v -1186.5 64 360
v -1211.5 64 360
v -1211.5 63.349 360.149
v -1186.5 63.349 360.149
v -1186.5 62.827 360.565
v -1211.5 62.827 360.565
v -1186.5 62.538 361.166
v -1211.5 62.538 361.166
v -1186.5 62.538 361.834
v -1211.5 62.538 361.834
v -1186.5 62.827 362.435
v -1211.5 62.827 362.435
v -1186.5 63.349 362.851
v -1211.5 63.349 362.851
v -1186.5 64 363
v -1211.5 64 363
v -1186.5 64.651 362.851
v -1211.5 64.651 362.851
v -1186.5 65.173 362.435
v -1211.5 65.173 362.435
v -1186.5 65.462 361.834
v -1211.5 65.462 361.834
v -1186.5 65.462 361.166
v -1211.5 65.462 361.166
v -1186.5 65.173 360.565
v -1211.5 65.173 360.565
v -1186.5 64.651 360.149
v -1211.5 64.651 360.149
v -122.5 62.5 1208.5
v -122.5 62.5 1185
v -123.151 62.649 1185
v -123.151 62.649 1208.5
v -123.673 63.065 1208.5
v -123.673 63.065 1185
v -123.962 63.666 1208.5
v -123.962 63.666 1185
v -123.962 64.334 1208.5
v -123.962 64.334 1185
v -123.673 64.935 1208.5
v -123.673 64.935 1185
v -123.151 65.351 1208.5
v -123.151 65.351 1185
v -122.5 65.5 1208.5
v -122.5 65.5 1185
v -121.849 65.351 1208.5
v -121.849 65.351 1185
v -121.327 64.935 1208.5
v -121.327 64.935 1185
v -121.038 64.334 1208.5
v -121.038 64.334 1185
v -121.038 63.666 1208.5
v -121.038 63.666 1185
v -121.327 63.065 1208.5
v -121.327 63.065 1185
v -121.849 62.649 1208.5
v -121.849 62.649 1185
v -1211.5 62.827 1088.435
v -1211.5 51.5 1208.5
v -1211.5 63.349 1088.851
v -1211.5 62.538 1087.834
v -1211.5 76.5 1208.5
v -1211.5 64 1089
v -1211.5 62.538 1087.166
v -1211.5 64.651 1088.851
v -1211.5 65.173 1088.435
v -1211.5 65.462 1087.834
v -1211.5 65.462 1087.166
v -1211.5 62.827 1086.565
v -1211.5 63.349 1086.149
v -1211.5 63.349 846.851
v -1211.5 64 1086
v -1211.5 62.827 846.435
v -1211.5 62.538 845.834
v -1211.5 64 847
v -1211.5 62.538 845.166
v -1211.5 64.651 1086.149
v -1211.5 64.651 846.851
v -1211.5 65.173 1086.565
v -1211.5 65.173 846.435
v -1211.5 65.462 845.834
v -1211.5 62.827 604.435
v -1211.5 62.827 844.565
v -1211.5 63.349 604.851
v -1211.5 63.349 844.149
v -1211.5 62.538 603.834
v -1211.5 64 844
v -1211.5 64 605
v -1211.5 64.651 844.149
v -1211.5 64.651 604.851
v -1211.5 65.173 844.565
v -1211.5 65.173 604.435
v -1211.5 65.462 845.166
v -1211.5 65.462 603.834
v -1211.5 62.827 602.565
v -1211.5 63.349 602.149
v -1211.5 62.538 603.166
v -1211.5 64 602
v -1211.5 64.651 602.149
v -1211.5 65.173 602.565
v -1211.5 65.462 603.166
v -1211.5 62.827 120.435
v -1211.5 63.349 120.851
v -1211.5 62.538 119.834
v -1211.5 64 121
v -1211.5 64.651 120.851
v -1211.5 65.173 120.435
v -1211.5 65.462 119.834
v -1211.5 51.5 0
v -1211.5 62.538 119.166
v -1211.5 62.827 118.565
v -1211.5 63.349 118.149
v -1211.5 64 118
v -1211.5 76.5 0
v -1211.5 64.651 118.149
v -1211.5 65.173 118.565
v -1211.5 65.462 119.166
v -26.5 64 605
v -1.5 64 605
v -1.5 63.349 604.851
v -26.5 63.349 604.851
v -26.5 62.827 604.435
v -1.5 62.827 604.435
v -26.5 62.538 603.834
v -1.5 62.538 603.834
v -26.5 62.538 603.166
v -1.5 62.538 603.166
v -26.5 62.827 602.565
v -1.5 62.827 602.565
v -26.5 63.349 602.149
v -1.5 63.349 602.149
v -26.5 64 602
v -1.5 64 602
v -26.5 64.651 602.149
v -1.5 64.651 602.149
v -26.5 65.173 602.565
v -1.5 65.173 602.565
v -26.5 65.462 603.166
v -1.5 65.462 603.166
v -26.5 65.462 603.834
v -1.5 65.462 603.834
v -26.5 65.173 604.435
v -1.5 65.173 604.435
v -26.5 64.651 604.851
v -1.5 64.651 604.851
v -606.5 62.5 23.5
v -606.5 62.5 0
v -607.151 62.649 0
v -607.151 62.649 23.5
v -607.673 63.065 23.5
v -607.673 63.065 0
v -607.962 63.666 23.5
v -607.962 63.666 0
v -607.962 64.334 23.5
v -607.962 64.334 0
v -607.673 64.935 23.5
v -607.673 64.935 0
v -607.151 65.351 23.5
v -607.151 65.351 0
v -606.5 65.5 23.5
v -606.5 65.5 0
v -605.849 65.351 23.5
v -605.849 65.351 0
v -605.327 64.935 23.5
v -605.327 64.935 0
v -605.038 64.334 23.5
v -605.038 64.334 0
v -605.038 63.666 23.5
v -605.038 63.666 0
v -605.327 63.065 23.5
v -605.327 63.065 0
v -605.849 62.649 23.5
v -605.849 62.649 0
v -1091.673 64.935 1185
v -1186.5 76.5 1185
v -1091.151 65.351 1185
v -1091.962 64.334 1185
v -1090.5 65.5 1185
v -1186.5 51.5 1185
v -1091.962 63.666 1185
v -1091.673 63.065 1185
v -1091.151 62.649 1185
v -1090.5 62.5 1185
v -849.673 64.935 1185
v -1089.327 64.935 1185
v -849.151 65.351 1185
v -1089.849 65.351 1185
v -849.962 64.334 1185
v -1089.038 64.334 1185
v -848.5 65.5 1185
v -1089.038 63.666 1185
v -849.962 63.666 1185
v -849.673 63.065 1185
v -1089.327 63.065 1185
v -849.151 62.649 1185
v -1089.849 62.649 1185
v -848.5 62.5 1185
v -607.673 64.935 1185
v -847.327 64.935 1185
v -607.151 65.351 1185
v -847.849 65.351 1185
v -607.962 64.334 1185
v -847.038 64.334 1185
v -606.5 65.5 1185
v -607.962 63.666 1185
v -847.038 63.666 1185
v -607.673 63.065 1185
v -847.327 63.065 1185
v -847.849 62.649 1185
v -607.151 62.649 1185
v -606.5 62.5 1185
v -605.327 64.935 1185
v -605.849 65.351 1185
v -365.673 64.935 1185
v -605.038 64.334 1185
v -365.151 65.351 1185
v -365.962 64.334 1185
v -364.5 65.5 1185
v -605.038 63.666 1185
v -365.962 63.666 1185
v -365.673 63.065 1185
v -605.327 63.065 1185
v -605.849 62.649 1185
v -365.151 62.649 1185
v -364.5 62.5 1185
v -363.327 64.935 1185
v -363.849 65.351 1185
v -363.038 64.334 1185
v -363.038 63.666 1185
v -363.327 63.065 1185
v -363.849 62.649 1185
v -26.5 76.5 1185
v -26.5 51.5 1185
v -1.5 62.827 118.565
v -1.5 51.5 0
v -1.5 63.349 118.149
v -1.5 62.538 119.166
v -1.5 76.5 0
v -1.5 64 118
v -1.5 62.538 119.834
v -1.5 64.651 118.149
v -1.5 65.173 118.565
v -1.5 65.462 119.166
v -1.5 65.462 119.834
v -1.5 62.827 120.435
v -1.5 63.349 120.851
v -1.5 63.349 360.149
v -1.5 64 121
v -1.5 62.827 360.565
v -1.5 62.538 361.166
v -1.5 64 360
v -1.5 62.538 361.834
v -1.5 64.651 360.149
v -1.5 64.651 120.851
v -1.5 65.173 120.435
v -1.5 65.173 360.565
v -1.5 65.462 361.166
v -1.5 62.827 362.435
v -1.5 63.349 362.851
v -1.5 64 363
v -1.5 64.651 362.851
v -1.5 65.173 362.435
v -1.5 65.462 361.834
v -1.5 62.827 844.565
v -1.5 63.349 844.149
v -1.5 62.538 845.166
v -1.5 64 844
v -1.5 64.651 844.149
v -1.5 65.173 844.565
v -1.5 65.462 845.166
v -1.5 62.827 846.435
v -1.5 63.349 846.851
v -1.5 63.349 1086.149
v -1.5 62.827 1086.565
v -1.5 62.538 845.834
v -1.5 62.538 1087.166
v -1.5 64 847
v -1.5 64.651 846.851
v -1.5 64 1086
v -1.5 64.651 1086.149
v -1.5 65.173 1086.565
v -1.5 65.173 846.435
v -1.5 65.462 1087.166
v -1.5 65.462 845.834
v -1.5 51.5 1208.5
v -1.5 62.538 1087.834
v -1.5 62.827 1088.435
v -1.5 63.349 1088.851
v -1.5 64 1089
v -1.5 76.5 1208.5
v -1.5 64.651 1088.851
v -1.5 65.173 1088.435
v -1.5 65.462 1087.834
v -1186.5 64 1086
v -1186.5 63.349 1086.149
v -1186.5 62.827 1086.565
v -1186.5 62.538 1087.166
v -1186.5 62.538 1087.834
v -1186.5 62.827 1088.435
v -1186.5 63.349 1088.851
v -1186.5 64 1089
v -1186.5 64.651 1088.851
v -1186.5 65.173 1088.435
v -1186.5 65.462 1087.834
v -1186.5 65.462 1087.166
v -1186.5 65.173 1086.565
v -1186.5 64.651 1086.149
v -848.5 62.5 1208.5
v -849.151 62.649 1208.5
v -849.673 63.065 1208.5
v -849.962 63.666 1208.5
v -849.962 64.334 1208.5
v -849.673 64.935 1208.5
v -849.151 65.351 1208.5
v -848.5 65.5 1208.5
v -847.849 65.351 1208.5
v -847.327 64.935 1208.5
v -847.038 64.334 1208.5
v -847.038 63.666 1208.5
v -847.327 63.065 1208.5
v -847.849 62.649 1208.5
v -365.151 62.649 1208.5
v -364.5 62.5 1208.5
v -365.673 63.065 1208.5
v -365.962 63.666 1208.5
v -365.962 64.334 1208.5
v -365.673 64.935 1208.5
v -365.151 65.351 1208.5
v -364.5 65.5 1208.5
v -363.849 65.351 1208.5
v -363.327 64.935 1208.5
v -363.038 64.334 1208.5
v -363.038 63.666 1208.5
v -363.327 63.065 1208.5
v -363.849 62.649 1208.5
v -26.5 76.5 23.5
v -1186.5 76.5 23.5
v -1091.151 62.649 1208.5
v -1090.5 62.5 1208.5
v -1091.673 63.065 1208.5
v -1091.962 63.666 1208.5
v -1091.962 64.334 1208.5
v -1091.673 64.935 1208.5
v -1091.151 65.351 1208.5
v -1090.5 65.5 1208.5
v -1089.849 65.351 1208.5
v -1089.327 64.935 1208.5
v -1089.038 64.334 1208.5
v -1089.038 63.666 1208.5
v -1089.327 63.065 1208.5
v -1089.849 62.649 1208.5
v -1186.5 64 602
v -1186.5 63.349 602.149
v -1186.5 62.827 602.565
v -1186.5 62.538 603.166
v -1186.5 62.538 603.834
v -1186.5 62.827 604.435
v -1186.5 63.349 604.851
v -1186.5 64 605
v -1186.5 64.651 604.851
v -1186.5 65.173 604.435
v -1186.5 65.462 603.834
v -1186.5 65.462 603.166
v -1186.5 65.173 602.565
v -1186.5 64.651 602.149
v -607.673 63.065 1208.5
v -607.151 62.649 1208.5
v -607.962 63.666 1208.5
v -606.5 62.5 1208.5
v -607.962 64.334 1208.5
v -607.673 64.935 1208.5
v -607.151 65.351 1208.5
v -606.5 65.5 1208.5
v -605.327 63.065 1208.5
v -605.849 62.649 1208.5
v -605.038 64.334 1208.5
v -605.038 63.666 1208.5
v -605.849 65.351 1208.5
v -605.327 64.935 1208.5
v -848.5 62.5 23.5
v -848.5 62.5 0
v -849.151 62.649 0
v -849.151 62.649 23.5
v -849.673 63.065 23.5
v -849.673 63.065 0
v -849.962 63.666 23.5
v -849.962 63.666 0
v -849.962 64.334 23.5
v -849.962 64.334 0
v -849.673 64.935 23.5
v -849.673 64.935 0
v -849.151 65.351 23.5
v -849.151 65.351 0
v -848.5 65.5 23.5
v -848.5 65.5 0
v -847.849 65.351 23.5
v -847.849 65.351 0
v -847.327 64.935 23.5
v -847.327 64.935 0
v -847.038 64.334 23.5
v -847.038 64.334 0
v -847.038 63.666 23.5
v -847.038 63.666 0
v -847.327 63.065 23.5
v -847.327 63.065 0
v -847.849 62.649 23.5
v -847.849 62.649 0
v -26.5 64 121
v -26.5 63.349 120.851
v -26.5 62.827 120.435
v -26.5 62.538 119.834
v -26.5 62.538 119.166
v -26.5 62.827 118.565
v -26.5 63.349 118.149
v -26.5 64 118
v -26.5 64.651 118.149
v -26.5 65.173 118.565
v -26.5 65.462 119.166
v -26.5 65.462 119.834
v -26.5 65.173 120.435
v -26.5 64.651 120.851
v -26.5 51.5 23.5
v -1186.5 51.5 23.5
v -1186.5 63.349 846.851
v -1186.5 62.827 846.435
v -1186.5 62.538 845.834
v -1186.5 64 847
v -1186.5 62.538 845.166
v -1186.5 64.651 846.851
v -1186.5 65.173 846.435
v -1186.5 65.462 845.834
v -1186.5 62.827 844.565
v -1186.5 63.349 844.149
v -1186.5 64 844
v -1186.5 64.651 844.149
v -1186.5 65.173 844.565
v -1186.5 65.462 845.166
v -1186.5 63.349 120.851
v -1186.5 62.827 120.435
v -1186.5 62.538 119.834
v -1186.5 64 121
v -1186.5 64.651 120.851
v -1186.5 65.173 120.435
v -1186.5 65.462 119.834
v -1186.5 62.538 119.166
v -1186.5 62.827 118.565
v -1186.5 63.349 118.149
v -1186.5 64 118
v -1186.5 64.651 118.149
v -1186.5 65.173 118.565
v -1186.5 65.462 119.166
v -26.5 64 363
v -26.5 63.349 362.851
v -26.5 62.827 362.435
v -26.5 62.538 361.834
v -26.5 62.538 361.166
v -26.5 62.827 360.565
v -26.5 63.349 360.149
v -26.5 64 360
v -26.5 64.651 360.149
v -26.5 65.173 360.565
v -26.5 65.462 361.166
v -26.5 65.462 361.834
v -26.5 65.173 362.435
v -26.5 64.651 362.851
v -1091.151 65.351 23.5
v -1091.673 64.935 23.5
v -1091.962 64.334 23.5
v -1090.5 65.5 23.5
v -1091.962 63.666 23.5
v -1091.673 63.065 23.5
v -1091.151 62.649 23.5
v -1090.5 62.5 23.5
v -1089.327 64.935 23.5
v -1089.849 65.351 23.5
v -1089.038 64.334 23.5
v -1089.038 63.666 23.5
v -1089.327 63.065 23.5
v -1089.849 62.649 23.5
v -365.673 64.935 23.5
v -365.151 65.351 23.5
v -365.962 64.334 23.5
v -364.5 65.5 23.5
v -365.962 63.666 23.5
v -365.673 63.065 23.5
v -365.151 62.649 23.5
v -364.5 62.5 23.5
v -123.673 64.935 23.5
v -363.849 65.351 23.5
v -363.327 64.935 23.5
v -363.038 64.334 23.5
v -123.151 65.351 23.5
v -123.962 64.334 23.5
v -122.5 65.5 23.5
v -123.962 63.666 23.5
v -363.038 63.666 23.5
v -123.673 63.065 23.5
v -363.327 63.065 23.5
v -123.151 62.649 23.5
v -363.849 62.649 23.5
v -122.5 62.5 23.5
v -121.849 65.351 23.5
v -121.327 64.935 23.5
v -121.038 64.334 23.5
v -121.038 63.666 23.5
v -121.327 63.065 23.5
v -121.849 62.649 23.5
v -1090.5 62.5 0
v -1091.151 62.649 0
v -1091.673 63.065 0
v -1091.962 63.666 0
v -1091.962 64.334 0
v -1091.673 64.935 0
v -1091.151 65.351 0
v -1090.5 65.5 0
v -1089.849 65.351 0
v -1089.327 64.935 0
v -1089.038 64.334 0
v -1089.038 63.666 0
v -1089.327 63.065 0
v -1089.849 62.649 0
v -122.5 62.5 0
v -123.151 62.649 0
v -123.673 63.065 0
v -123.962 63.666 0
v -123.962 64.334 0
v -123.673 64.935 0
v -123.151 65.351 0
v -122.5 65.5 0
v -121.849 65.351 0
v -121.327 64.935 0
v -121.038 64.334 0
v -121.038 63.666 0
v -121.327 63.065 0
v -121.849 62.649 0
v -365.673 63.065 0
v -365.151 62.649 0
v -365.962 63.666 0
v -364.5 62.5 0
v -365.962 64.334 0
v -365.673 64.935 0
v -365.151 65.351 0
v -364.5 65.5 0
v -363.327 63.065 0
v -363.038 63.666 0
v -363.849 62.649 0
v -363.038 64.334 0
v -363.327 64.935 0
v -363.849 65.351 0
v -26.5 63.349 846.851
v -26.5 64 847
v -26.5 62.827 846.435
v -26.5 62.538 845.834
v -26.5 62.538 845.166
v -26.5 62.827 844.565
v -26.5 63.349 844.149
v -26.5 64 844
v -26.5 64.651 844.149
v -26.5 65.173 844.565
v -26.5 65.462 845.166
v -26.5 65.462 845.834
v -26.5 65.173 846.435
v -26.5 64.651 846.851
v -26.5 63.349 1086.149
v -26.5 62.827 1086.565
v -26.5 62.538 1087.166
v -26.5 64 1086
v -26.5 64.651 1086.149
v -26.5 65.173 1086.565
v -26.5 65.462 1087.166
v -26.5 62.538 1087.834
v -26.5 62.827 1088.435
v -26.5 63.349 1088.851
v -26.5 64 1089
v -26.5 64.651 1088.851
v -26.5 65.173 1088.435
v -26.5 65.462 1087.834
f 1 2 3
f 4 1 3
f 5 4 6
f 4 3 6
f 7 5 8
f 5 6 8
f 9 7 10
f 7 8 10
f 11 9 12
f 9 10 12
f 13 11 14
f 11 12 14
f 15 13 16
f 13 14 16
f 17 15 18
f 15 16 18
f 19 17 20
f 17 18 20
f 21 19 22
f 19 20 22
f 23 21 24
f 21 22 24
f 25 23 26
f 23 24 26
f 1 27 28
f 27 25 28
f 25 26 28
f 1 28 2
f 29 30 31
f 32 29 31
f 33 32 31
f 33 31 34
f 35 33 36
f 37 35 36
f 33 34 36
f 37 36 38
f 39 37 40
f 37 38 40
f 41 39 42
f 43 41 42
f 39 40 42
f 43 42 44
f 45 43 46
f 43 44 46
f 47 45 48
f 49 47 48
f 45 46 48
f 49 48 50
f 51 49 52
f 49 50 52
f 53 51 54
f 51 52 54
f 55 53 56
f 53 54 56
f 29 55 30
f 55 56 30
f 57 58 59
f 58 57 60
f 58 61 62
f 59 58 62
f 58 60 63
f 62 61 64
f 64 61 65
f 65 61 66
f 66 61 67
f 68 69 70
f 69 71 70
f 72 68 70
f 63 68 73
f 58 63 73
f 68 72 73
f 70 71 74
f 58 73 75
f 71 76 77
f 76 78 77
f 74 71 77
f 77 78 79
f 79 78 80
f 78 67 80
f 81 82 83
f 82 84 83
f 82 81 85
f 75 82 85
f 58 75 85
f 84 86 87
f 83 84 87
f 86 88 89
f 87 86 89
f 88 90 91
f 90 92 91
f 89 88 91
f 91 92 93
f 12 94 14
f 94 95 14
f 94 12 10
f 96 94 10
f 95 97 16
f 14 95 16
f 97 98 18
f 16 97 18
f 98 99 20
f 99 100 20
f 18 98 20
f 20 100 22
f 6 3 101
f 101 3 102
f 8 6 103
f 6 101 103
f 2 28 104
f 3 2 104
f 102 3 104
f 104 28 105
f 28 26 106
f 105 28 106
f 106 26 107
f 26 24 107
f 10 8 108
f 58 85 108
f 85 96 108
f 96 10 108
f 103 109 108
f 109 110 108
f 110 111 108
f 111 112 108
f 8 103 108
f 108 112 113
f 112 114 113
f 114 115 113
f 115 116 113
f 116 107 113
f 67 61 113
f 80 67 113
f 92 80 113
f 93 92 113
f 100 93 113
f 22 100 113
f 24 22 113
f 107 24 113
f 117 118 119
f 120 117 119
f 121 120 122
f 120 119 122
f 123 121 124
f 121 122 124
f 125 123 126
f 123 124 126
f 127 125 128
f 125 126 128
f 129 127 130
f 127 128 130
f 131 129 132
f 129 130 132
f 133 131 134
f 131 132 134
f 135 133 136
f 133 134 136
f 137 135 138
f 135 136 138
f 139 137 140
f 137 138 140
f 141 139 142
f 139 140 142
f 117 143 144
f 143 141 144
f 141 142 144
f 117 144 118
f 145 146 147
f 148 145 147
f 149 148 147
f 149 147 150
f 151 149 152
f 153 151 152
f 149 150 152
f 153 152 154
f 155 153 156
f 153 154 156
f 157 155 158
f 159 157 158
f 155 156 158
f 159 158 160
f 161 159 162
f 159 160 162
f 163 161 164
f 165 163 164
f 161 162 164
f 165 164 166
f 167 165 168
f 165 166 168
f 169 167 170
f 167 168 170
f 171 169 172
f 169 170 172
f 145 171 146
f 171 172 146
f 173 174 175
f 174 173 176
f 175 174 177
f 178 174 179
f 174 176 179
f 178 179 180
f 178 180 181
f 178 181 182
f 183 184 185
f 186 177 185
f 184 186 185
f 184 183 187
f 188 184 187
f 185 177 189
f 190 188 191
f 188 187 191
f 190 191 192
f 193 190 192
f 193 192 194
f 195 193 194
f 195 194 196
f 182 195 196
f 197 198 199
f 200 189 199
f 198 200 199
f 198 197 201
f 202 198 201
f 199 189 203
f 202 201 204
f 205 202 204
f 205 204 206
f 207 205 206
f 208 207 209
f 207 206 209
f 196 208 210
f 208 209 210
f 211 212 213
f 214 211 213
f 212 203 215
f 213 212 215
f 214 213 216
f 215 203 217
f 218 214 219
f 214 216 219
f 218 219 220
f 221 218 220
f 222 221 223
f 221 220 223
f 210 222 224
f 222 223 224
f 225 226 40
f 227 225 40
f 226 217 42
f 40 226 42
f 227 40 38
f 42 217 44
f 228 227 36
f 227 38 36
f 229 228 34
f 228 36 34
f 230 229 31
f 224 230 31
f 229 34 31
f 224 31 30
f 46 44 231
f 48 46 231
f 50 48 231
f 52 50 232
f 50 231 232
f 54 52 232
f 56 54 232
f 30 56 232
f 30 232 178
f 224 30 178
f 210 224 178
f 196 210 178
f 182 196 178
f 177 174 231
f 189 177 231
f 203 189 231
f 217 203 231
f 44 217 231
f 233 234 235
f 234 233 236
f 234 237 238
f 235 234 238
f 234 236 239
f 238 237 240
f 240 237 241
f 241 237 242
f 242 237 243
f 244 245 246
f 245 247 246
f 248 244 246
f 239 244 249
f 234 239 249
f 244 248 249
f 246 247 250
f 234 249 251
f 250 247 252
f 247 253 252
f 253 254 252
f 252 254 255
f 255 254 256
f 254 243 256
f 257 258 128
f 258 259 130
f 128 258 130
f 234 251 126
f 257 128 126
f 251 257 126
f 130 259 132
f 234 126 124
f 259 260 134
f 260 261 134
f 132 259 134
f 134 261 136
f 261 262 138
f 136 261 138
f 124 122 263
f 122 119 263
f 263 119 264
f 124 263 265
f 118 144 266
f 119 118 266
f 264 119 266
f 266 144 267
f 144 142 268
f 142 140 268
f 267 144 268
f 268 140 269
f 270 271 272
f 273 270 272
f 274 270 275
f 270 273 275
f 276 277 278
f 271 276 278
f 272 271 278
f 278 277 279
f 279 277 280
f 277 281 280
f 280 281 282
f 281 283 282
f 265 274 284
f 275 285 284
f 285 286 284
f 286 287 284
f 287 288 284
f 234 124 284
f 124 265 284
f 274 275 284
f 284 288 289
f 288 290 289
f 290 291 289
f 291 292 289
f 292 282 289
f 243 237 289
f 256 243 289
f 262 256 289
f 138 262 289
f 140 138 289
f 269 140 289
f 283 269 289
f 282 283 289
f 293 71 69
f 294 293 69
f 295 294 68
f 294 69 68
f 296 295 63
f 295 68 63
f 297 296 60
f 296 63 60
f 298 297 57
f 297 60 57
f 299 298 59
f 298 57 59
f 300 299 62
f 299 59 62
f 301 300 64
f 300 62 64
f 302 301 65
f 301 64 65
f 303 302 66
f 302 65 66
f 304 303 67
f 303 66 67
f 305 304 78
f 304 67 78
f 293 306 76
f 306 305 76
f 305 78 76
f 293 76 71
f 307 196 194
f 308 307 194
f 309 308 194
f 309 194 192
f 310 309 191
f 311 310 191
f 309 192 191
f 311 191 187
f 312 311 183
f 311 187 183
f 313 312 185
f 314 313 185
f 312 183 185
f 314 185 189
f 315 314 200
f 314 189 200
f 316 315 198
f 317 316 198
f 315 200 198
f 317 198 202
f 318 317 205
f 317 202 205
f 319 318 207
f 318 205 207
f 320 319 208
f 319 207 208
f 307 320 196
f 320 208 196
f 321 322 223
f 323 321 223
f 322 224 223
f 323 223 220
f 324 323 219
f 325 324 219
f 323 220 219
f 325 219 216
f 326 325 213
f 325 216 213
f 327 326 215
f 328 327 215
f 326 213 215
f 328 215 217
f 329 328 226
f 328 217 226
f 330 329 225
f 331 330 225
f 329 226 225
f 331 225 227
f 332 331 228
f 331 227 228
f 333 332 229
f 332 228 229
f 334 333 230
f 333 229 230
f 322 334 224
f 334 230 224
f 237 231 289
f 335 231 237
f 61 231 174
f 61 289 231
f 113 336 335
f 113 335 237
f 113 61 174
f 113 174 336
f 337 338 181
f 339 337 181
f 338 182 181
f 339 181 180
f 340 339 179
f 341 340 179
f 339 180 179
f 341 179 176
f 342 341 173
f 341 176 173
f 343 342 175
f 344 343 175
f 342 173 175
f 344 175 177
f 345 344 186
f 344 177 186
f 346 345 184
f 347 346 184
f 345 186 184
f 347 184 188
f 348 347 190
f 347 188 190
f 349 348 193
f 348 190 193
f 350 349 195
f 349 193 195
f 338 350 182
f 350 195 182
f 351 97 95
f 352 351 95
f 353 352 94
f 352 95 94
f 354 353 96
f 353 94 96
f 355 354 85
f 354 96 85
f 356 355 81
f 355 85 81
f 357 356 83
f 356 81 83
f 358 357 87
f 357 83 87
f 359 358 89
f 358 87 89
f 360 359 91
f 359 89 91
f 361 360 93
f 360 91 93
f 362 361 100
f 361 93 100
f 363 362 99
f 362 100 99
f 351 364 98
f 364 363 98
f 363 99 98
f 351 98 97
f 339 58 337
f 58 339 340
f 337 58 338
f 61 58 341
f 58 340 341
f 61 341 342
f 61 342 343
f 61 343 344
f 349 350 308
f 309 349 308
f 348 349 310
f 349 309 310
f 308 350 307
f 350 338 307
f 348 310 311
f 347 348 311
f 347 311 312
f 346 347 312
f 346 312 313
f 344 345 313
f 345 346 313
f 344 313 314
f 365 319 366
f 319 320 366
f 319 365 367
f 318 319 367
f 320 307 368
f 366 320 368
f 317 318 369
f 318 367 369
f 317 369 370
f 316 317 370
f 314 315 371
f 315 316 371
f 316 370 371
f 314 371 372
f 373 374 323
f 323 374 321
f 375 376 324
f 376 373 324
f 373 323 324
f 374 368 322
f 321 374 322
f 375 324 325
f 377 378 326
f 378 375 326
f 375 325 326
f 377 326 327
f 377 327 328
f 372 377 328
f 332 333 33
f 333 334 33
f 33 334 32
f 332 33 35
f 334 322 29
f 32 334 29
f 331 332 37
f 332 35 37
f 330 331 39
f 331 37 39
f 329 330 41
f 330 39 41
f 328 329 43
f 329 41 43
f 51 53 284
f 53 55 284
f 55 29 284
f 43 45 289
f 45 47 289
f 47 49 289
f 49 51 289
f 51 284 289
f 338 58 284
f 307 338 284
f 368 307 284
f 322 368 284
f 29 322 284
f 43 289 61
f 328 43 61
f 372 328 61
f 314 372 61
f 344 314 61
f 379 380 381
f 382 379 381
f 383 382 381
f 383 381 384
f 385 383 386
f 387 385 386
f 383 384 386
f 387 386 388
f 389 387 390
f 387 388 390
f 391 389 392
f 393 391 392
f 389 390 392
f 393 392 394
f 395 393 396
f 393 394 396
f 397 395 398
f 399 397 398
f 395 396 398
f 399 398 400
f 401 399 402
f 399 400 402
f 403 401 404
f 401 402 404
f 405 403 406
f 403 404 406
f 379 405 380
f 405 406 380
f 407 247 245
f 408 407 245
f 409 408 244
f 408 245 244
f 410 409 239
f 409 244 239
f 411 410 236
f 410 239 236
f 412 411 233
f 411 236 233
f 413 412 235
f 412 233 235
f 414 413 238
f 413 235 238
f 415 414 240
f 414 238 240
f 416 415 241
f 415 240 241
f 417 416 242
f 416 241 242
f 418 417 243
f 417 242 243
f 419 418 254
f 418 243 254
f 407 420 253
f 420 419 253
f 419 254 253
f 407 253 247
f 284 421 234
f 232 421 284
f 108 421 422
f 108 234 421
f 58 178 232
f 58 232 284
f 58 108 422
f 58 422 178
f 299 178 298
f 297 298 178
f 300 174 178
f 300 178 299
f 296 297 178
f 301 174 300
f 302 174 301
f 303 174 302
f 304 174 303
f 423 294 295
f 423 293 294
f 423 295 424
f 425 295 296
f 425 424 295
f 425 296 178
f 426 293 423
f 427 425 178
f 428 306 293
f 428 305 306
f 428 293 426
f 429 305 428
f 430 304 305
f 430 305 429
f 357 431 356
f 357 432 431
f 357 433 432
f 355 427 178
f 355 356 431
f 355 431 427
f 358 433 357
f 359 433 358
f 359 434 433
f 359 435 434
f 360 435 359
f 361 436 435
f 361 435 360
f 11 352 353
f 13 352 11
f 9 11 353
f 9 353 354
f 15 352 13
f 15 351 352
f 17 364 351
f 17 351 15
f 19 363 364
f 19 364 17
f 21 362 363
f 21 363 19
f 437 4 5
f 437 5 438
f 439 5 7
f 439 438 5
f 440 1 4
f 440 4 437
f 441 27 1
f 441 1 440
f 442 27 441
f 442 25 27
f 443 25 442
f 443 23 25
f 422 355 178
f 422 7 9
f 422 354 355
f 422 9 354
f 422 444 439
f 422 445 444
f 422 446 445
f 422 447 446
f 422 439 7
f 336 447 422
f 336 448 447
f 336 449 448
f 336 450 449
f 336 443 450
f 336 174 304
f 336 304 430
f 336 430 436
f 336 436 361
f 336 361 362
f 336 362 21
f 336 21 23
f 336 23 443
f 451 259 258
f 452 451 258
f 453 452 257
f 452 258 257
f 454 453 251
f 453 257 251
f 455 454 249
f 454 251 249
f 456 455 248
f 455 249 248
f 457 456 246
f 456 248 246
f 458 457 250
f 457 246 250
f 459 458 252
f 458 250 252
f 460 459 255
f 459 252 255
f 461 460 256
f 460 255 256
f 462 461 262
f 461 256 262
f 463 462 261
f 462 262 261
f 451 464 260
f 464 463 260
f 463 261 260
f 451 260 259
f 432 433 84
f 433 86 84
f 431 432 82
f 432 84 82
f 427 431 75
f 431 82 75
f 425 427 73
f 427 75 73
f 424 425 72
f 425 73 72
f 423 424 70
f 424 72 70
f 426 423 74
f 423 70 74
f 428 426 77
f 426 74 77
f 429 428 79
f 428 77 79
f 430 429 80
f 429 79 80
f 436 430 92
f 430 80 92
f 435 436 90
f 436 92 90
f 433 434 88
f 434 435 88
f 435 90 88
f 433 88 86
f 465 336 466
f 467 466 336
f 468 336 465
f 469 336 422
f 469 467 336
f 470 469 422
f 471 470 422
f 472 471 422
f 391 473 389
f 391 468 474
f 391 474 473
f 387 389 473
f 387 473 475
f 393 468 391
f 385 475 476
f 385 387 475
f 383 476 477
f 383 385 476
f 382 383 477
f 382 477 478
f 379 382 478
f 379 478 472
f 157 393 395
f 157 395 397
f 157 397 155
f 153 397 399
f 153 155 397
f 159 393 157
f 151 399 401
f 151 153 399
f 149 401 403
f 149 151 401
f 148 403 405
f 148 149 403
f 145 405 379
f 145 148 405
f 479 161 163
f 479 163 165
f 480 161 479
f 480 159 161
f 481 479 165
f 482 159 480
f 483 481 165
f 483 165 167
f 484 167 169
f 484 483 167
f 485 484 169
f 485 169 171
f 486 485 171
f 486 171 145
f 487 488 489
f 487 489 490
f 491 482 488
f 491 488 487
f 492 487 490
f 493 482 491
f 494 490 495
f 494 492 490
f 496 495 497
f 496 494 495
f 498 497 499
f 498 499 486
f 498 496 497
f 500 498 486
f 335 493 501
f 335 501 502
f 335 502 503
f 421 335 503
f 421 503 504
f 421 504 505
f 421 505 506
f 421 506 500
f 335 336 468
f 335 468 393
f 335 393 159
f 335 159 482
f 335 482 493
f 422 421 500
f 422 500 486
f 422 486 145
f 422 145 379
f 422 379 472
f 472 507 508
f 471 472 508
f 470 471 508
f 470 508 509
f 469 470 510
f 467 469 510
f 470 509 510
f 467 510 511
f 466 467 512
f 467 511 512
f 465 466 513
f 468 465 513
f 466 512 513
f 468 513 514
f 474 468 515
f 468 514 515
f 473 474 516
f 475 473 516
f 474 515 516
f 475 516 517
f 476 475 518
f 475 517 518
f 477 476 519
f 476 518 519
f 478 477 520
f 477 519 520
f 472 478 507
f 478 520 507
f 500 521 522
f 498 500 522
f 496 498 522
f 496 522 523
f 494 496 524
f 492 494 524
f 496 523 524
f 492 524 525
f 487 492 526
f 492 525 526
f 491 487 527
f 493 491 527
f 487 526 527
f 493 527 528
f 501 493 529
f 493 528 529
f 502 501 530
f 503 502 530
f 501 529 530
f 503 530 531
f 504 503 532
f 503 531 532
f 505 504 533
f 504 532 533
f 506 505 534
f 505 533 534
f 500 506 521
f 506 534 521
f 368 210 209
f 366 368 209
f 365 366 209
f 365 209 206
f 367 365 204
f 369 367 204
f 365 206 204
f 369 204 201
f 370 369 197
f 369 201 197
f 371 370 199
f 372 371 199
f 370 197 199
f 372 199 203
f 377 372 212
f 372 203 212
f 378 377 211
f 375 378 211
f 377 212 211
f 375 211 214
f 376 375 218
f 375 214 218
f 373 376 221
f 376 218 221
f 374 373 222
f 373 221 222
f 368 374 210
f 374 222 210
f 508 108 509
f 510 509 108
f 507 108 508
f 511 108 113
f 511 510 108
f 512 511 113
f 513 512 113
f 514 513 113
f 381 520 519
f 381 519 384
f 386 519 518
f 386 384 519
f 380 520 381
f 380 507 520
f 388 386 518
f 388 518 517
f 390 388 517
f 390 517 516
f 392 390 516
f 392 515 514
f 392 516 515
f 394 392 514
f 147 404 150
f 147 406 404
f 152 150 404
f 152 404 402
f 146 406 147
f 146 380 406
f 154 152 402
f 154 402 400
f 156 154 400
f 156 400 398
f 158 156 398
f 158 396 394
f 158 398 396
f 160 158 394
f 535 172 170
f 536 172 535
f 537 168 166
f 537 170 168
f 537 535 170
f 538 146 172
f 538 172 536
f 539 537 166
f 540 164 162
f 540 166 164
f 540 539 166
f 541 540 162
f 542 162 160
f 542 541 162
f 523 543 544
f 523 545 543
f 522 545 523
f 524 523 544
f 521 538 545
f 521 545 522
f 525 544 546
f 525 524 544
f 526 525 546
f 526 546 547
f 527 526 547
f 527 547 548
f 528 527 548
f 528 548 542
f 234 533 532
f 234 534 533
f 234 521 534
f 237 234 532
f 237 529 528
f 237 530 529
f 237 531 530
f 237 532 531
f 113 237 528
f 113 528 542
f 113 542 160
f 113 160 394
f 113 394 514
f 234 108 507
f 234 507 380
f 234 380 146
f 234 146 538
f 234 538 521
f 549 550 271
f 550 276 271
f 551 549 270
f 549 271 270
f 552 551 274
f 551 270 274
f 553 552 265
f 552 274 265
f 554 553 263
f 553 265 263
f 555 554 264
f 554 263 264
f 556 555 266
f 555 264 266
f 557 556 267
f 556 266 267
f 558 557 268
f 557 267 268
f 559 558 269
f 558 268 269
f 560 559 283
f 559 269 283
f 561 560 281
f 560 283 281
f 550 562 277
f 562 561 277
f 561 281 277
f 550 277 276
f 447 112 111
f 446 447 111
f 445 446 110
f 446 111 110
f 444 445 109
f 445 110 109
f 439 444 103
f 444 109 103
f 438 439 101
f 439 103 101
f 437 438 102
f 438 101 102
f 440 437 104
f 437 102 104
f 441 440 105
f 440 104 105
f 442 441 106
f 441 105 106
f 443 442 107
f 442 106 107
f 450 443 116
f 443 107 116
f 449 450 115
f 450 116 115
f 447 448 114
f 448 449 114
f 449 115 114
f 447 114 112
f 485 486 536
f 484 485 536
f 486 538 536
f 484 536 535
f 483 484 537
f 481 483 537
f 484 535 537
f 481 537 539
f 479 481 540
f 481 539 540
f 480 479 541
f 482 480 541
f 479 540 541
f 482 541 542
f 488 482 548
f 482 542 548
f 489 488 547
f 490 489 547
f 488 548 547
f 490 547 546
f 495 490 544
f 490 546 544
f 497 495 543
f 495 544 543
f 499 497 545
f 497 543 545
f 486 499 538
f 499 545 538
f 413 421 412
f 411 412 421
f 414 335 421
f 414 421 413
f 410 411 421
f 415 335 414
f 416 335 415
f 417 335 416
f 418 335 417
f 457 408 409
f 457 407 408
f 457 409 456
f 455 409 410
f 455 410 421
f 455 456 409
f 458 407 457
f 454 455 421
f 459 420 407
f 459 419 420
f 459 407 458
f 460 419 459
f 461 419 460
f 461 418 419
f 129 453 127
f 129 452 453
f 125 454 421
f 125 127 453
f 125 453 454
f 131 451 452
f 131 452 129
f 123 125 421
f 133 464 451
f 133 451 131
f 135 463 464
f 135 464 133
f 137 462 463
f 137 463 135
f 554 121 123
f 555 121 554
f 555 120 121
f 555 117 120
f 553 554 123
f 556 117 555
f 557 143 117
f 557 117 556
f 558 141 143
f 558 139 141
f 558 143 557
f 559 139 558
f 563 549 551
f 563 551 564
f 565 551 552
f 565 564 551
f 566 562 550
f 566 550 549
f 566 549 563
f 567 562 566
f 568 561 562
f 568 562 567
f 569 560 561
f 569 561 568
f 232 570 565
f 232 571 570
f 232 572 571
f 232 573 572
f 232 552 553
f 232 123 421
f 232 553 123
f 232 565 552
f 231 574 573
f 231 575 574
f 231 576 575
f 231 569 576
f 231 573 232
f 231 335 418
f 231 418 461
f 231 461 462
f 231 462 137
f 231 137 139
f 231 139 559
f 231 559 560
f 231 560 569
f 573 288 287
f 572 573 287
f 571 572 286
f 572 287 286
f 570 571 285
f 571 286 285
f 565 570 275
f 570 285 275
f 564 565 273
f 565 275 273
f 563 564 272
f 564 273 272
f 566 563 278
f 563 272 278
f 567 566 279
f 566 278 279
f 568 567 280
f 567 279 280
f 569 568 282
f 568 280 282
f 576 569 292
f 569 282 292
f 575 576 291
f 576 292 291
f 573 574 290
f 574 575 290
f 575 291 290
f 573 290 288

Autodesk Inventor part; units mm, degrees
ref_plane "YZ Plane" through (0, 0, 0) normal (1, 0, 0) x (0, 1, 0)
ref_plane "XZ Plane" through (0, 0, 0) normal (0, 1, 0) x (-1, 0, 0)
ref_plane "XY Plane" through (0, 0, 0) normal (0, 0, 1) x (1, 0, 0)
ref_plane "Work Plane1" through (-1.5, 0, 1210) normal (-1, 0, 0) x (0, 0, 1)
sketch "Sketch1" plane through (-1.5, 0, 1210) normal (-1, 0, 0) x (0, 0, 1)
  circle A0 centre (-606.5, 339) radius 1.5 projected
  circle A1 centre (-848.5, 64) radius 1.5 projected
  circle A2 centre (-1090.5, 339) radius 1.5 projected
  circle A3 centre (-848.5, 614) radius 1.5 projected
  circle A4 centre (-364.5, 614) radius 1.5 projected
  circle A5 centre (-364.5, 64) radius 1.5 projected
  circle A6 centre (-122.5, 339) radius 1.5 projected
  circle A7 centre (-122.5, 614) radius 1.5 projected
  circle A8 centre (-122.5, 64) radius 1.5 projected
  circle A9 centre (-364.5, 339) radius 1.5 projected
  circle A10 centre (-606.5, 614) radius 1.5 projected
  circle A11 centre (-1090.5, 614) radius 1.5 projected
  circle A12 centre (-1090.5, 64) radius 1.5 projected
  circle A13 centre (-848.5, 339) radius 1.5 projected
  circle A14 centre (-606.5, 64) radius 1.5 projected
  line L0 (-1211.5, 0) -> (0, 0) projected
  line L1 (0, 0) -> (0, 1000) projected
  line L2 (-1211.5, 1000) -> (0, 1000) projected
  line L3 (-1211.5, 0) -> (-1211.5, 1000) projected
  line L4 (-25, 76.5) -> (-1186.5, 76.5)
  line L5 (-1186.5, 76.5) -> (-1186.5, 51.5)
  line L6 (-1186.5, 51.5) -> (-25, 51.5)
  line L7 (-25, 51.5) -> (-25, 76.5)
  line L8 (-122.5, 64) -> (-114.6022, 64)
  point P0 (-1210, 0)
  dimension "d0" = 25
  dimension "d1" = 25
  dimension "d2" = 25
ref_plane "Work Plane2" through (-1211.5, 0, -1.5) normal (1, 0, 0) x (0, 0, -1)
sketch "Sketch2" plane through (-1211.5, 0, -1.5) normal (1, 0, 0) x (0, 0, -1)
  line L0 (-25, 51.5) -> (-1186.5, 51.5) projected
  line L1 (-25, 76.5) -> (-25, 51.5) projected
  line L2 (-1186.5, 76.5) -> (-25, 76.5) projected
  line L3 (-1186.5, 51.5) -> (-1186.5, 76.5) projected
  circle A0 centre (-121, 64) radius 1.5 projected
  circle A1 centre (-363, 64) radius 1.5 projected
  circle A2 centre (-605, 64) radius 1.5 projected
  circle A3 centre (-847, 64) radius 1.5 projected
  circle A4 centre (-1089, 64) radius 1.5 projected
  point P0 (-1.5, 0)
extrude "Extrusion1" add sketch "Sketch2" along normal blind 25
extrude "Extrusion2" add sketch "Sketch1" along normal blind 25 contours L7 L6 L5 L4
ref_plane "Work Plane3" through (-1.5, 0, 1210) normal (-1, 0, 0) x (0, 0, 1)
sketch "Sketch3" plane through (-1.5, 0, 1210) normal (-1, 0, 0) x (0, 0, 1)
  line L0 (-1186.5, 76.5) -> (-1186.5, 51.5) projected
  line L1 (-1186.5, 51.5) -> (-1210, 51.5)
  line L2 (-1210, 51.5) -> (-1210, 76.5)
  line L3 (-1210, 76.5) -> (-1186.5, 76.5)
  line L4 (-1186.5, 76.5) -> (-1186.5, 51.5)
  line L5 (-1.5, 0) -> (-1.5, 1000) projected
  line L6 (-25, 76.5) -> (-25, 51.5) projected
  line L7 (-25, 51.5) -> (-1.5, 51.5)
  line L8 (-1.5, 51.5) -> (-1.5, 76.5)
  line L9 (-1.5, 76.5) -> (-25, 76.5)
  line L10 (-25, 76.5) -> (-25, 51.5)
  point P0 (-1210, 0)
extrude "Extrusion3" add sketch "Sketch3" along normal up to surface (1210 mm away)
sketch "Sketch4" plane through (-1.5, 51.5, 1208.5) normal (0, 0, 1) x (1, 0, 0)
  circle A0 centre (-121, 12.5) radius 1.5 projected
  circle A1 centre (-363, 12.5) radius 1.5 projected
  circle A2 centre (-605, 12.5) radius 1.5 projected
  circle A3 centre (-847, 12.5) radius 1.5 projected
  circle A4 centre (-1089, 12.5) radius 1.5 projected
  point P0 (1.5, -51.5)
hole "Hole1" at (-122.5, 64, 1208.5) at (-606.5, 64, 1208.5) at (-364.5, 64, 1208.5) at (-848.5, 64, 1208.5) at (-1090.5, 64, 1208.5) direction (0, 0, -1) diameter 3 end through all
properties part number "HoneyComb Frame"
